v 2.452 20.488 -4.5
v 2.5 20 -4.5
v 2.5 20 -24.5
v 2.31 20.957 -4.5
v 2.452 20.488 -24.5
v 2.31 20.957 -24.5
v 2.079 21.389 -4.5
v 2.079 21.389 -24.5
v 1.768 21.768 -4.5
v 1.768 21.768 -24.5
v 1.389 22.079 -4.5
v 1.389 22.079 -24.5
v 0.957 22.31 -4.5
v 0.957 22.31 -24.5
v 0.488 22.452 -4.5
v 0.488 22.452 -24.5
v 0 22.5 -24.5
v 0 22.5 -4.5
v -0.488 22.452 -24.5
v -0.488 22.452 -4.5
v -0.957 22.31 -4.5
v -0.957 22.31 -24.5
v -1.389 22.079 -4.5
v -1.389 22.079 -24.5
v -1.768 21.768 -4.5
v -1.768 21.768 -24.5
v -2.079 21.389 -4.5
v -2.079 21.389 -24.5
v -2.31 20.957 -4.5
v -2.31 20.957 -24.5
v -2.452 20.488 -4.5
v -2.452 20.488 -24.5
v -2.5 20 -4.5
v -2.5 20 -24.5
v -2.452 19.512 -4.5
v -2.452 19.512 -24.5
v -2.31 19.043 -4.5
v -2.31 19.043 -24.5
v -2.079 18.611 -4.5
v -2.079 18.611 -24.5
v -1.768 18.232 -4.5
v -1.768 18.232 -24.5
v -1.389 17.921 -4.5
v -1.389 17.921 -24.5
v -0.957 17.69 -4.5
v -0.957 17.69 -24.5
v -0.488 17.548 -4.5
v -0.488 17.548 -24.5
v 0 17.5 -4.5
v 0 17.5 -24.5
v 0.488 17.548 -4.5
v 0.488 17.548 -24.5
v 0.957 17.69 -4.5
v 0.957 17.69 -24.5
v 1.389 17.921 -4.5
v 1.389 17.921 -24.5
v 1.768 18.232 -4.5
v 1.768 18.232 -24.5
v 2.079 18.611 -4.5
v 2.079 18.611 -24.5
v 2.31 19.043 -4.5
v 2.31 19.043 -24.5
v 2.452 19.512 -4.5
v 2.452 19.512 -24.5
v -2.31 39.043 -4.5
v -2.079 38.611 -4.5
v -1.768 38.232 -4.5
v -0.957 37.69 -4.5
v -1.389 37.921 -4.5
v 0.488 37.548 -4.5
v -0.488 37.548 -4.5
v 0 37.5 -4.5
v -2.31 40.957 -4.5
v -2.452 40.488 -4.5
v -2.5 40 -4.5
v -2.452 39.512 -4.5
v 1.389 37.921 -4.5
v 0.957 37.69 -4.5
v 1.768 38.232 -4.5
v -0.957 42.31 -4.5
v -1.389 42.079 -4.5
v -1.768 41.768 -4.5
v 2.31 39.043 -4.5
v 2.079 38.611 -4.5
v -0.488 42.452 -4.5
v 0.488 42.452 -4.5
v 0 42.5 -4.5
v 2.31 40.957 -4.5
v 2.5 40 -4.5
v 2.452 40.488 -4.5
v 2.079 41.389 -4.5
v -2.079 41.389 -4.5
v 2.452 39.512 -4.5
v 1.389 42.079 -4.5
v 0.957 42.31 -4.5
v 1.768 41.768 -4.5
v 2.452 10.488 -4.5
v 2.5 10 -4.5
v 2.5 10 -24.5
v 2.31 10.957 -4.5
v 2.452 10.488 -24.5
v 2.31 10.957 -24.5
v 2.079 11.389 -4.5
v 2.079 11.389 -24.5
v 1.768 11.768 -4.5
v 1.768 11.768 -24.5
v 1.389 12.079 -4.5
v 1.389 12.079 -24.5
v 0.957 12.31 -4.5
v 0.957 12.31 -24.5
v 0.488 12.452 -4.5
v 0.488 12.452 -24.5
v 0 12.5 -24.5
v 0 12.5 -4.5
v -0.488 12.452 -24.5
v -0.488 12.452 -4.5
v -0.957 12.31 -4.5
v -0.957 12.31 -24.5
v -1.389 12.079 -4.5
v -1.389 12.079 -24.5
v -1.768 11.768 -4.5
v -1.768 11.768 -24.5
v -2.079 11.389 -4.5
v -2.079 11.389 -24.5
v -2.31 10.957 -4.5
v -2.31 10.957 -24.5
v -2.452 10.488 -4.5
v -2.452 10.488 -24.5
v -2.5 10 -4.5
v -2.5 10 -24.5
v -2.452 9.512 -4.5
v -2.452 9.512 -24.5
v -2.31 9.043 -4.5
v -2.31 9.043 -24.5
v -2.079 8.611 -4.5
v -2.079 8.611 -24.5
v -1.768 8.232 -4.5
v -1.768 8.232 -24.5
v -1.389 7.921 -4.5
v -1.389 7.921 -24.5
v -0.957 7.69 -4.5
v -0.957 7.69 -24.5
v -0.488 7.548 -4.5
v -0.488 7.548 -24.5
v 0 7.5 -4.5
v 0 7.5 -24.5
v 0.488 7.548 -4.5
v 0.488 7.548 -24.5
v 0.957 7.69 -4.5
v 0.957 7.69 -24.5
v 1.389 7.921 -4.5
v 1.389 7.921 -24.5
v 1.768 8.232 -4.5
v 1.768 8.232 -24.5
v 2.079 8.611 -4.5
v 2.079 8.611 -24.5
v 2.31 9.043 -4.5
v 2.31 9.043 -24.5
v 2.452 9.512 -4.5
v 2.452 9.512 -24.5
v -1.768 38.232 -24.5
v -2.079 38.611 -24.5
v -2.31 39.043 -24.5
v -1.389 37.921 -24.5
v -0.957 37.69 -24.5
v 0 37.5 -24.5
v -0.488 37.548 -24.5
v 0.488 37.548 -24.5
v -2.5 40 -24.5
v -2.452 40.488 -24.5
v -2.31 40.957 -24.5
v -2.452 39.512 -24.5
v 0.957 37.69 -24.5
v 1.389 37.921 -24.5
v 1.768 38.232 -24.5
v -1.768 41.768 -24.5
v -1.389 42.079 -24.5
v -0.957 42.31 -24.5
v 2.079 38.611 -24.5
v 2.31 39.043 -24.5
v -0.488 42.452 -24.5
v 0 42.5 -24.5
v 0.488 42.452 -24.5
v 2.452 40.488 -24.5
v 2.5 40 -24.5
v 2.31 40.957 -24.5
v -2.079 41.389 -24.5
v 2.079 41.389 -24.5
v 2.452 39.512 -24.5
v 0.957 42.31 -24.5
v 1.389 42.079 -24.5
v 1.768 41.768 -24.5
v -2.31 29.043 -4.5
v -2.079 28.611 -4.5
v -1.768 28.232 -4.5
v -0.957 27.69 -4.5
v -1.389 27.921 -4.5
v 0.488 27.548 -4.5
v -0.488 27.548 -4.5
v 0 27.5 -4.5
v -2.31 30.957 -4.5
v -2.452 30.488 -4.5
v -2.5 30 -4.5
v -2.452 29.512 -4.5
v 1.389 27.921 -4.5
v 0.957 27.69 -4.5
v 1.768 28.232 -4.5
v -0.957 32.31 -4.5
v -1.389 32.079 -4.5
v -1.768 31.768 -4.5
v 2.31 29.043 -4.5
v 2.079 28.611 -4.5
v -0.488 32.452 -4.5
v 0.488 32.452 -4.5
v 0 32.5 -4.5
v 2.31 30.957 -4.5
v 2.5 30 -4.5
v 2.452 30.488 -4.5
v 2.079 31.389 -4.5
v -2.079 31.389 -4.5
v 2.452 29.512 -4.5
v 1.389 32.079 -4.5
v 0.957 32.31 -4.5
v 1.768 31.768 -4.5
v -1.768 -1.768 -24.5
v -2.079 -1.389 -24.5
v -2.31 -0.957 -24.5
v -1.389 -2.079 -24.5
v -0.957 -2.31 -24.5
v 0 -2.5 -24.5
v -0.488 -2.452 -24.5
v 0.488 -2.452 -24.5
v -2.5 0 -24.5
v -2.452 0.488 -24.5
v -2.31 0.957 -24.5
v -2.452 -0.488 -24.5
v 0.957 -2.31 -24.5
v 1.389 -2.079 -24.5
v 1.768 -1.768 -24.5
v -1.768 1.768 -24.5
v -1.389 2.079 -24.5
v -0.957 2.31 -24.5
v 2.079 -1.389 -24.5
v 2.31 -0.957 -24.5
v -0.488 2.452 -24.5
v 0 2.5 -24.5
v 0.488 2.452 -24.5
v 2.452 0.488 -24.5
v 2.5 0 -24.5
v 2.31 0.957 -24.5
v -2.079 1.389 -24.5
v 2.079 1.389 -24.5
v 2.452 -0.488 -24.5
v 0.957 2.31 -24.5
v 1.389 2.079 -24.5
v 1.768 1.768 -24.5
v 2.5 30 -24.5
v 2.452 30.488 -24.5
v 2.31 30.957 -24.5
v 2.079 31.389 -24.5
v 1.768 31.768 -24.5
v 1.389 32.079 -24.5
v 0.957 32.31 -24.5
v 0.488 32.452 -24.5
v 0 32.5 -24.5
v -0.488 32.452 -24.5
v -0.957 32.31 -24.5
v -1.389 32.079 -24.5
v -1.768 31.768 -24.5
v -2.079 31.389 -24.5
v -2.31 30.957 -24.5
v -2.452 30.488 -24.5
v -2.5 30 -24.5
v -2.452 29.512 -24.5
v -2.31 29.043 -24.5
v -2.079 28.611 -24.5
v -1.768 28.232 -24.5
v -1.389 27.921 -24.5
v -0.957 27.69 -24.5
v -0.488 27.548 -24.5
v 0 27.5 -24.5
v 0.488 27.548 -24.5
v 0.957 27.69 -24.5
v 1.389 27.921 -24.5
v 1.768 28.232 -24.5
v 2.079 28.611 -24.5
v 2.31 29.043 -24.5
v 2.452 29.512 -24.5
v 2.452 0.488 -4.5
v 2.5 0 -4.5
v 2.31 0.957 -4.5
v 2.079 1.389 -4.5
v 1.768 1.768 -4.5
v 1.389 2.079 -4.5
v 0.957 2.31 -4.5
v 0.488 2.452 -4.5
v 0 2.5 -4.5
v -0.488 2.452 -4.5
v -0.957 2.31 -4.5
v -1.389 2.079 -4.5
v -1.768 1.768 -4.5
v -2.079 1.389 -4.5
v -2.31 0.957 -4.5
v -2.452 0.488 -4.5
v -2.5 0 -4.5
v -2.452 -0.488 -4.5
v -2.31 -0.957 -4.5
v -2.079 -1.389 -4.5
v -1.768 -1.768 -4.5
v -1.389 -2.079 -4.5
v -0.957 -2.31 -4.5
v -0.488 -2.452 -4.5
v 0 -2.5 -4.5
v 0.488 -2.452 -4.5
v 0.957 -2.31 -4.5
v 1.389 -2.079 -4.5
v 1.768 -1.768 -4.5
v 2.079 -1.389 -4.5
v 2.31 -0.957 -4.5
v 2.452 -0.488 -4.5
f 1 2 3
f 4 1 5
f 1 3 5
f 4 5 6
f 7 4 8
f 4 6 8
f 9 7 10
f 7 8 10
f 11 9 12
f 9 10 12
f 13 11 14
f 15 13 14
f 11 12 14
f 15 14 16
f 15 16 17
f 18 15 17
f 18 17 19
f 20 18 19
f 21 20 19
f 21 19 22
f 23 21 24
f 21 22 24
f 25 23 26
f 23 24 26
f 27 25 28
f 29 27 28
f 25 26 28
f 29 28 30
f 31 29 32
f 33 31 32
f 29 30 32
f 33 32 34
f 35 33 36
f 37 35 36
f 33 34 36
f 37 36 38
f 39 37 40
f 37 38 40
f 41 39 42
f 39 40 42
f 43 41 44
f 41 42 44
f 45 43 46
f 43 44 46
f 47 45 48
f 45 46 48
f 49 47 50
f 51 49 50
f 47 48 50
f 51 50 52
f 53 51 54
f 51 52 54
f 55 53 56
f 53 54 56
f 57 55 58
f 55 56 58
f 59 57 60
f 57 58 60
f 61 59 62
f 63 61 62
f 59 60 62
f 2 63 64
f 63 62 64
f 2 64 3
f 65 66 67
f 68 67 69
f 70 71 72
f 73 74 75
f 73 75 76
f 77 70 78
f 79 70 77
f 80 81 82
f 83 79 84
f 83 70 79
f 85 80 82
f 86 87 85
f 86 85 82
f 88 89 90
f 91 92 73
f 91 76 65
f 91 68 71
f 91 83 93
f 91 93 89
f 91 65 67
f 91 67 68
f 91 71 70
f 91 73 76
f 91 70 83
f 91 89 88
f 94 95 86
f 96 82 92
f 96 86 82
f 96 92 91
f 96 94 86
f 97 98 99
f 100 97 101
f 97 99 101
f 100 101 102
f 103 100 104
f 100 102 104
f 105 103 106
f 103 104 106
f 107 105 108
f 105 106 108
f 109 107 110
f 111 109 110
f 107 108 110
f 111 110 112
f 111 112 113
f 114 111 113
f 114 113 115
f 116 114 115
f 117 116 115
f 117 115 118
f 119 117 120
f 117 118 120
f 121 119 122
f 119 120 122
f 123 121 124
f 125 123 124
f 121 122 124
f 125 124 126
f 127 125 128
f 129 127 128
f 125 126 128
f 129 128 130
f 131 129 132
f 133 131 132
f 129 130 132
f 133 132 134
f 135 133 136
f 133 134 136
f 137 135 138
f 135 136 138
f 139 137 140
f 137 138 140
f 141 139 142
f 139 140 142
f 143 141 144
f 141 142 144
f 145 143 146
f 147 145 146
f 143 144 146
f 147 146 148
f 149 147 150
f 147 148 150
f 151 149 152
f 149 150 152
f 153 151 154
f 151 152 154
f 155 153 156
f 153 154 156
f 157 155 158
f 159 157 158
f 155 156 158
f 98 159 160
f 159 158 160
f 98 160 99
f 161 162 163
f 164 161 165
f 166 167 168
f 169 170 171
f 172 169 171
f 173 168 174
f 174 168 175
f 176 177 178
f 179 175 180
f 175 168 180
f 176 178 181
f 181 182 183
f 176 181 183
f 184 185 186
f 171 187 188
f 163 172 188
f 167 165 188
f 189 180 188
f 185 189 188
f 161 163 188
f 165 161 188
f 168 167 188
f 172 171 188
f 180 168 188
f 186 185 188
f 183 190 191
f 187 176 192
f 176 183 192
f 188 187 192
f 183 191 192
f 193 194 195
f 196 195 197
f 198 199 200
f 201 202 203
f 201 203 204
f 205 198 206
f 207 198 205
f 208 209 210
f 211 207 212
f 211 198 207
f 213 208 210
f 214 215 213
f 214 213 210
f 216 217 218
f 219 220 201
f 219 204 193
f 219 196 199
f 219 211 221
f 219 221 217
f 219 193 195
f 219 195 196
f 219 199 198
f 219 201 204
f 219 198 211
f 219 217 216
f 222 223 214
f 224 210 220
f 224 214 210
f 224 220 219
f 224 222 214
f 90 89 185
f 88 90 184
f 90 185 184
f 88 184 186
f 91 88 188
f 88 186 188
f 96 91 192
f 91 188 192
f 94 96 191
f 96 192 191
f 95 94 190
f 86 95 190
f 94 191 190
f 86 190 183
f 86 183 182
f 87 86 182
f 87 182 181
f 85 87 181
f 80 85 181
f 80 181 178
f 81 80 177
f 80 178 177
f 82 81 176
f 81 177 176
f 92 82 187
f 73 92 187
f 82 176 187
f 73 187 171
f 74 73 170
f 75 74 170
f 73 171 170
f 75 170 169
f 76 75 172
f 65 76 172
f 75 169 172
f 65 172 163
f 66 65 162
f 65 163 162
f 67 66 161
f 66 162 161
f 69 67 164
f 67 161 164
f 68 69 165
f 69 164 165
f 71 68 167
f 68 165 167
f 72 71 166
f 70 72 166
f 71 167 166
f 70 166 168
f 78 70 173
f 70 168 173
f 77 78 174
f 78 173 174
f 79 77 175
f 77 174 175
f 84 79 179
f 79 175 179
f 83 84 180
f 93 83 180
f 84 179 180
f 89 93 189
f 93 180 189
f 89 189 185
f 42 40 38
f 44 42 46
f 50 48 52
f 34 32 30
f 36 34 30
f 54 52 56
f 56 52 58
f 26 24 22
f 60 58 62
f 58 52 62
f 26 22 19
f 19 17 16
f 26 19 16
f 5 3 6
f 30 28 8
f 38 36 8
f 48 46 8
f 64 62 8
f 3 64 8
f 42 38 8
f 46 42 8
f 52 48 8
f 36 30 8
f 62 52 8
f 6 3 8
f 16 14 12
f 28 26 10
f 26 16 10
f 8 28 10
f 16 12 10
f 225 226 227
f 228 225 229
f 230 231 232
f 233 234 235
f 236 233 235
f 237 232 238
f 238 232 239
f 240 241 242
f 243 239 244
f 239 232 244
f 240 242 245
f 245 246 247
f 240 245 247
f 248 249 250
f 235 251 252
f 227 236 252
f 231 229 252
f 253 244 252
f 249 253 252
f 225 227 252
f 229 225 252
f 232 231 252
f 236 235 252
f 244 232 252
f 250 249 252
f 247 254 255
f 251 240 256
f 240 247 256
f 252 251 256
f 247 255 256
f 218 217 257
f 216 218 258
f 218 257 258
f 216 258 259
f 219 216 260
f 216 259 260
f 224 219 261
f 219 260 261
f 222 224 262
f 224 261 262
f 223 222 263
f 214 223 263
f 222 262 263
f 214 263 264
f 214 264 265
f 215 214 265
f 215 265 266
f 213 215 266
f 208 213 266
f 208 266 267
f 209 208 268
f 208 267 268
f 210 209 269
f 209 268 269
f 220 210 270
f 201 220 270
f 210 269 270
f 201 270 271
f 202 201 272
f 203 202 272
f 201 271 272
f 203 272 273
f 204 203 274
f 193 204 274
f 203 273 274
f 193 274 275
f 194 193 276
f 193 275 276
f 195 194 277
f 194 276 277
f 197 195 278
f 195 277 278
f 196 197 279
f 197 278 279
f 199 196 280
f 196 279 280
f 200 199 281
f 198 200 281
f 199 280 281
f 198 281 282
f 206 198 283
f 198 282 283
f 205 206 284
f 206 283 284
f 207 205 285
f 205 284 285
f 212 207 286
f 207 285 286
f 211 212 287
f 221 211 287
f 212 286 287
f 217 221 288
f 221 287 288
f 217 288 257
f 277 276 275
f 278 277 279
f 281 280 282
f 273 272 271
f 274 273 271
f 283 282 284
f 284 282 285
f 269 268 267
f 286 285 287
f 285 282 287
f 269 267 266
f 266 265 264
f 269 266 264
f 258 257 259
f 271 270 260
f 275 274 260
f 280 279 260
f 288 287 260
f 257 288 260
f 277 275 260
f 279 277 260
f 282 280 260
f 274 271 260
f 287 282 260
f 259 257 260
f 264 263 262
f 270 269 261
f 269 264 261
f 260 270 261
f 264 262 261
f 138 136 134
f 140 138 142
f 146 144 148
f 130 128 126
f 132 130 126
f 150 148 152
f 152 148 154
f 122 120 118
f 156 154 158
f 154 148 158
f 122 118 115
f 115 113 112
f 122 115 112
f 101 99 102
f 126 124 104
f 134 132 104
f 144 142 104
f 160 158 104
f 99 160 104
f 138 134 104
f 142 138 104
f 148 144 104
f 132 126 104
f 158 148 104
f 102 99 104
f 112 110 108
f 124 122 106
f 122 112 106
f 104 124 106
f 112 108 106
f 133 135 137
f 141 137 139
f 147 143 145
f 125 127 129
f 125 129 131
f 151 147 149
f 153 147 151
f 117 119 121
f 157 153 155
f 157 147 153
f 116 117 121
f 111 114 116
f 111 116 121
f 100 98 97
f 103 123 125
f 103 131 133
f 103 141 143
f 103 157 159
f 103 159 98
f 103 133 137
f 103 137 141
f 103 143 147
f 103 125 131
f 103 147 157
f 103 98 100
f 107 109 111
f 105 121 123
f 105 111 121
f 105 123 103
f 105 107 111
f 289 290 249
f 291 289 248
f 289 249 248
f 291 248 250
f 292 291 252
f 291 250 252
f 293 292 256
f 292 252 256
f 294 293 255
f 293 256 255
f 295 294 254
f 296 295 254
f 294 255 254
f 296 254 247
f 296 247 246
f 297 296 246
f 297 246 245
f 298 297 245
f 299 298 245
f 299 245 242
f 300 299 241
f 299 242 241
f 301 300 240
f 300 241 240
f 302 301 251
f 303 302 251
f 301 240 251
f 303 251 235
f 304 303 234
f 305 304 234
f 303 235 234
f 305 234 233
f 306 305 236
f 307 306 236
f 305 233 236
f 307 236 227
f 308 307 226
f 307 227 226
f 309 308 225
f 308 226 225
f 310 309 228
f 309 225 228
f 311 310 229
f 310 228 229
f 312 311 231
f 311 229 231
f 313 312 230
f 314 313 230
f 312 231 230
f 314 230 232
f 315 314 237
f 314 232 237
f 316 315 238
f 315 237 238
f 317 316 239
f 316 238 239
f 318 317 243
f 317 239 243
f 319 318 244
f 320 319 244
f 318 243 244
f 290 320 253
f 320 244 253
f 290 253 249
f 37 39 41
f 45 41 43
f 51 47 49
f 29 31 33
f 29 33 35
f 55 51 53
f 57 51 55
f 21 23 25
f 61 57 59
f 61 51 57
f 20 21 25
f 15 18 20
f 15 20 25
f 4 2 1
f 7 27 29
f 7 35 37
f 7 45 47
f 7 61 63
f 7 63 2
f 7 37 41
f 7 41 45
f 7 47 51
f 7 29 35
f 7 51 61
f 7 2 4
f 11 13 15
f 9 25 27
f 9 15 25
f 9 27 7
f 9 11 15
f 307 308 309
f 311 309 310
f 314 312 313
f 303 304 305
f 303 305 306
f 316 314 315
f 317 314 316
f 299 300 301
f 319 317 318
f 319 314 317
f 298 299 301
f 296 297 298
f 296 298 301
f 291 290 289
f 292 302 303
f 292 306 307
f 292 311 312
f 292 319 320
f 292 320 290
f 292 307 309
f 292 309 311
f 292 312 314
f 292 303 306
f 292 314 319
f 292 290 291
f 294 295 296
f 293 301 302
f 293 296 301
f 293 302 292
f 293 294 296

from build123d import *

# Parameters (mm, degrees)
CYLINDER006_R     = 2.5
CYLINDER006_DEPTH = 20
CYLINDER007_R     = 2.5
CYLINDER007_DEPTH = 20
CYLINDER008_R     = 2.5
CYLINDER008_DEPTH = 20
CYLINDER009_R     = 2.5
CYLINDER009_DEPTH = 20
CYLINDER005_R     = 2.5
CYLINDER005_DEPTH = 20


with BuildPart() as cylinder006:
    # cylinder006 → cylinder006 (new body)
    with BuildSketch(Plane(origin=(0, 10, -24.5), x_dir=(1, 0, 0), z_dir=(0, 0, 1))):
        Circle(CYLINDER006_R)
    extrude(amount=CYLINDER006_DEPTH)


with BuildPart() as cylinder007:
    # cylinder007 → cylinder007 (new body)
    with BuildSketch(Plane(origin=(0, 20, -24.5), x_dir=(1, 0, 0), z_dir=(0, 0, 1))):
        Circle(CYLINDER007_R)
    extrude(amount=CYLINDER007_DEPTH)


with BuildPart() as cylinder008:
    # cylinder008 → cylinder008 (new body)
    with BuildSketch(Plane(origin=(0, 30, -24.5), x_dir=(1, 0, 0), z_dir=(0, 0, 1))):
        Circle(CYLINDER008_R)
    extrude(amount=CYLINDER008_DEPTH)


with BuildPart() as cylinder009:
    # cylinder009 → cylinder009 (new body)
    with BuildSketch(Plane(origin=(0, 40, -24.5), x_dir=(1, 0, 0), z_dir=(0, 0, 1))):
        Circle(CYLINDER009_R)
    extrude(amount=CYLINDER009_DEPTH)


with BuildPart() as matrix_union:
    # cylinder005 → cylinder005 (new body)
    with BuildSketch(Plane.XY.offset(-24.5)):
        Circle(CYLINDER005_R)
    extrude(amount=CYLINDER005_DEPTH)

    # Matrix_Union: union cylinder006, cylinder007, cylinder008, cylinder009
    add(cylinder006.part)
    add(cylinder007.part)
    add(cylinder008.part)
    add(cylinder009.part)


solid = matrix_union.part
